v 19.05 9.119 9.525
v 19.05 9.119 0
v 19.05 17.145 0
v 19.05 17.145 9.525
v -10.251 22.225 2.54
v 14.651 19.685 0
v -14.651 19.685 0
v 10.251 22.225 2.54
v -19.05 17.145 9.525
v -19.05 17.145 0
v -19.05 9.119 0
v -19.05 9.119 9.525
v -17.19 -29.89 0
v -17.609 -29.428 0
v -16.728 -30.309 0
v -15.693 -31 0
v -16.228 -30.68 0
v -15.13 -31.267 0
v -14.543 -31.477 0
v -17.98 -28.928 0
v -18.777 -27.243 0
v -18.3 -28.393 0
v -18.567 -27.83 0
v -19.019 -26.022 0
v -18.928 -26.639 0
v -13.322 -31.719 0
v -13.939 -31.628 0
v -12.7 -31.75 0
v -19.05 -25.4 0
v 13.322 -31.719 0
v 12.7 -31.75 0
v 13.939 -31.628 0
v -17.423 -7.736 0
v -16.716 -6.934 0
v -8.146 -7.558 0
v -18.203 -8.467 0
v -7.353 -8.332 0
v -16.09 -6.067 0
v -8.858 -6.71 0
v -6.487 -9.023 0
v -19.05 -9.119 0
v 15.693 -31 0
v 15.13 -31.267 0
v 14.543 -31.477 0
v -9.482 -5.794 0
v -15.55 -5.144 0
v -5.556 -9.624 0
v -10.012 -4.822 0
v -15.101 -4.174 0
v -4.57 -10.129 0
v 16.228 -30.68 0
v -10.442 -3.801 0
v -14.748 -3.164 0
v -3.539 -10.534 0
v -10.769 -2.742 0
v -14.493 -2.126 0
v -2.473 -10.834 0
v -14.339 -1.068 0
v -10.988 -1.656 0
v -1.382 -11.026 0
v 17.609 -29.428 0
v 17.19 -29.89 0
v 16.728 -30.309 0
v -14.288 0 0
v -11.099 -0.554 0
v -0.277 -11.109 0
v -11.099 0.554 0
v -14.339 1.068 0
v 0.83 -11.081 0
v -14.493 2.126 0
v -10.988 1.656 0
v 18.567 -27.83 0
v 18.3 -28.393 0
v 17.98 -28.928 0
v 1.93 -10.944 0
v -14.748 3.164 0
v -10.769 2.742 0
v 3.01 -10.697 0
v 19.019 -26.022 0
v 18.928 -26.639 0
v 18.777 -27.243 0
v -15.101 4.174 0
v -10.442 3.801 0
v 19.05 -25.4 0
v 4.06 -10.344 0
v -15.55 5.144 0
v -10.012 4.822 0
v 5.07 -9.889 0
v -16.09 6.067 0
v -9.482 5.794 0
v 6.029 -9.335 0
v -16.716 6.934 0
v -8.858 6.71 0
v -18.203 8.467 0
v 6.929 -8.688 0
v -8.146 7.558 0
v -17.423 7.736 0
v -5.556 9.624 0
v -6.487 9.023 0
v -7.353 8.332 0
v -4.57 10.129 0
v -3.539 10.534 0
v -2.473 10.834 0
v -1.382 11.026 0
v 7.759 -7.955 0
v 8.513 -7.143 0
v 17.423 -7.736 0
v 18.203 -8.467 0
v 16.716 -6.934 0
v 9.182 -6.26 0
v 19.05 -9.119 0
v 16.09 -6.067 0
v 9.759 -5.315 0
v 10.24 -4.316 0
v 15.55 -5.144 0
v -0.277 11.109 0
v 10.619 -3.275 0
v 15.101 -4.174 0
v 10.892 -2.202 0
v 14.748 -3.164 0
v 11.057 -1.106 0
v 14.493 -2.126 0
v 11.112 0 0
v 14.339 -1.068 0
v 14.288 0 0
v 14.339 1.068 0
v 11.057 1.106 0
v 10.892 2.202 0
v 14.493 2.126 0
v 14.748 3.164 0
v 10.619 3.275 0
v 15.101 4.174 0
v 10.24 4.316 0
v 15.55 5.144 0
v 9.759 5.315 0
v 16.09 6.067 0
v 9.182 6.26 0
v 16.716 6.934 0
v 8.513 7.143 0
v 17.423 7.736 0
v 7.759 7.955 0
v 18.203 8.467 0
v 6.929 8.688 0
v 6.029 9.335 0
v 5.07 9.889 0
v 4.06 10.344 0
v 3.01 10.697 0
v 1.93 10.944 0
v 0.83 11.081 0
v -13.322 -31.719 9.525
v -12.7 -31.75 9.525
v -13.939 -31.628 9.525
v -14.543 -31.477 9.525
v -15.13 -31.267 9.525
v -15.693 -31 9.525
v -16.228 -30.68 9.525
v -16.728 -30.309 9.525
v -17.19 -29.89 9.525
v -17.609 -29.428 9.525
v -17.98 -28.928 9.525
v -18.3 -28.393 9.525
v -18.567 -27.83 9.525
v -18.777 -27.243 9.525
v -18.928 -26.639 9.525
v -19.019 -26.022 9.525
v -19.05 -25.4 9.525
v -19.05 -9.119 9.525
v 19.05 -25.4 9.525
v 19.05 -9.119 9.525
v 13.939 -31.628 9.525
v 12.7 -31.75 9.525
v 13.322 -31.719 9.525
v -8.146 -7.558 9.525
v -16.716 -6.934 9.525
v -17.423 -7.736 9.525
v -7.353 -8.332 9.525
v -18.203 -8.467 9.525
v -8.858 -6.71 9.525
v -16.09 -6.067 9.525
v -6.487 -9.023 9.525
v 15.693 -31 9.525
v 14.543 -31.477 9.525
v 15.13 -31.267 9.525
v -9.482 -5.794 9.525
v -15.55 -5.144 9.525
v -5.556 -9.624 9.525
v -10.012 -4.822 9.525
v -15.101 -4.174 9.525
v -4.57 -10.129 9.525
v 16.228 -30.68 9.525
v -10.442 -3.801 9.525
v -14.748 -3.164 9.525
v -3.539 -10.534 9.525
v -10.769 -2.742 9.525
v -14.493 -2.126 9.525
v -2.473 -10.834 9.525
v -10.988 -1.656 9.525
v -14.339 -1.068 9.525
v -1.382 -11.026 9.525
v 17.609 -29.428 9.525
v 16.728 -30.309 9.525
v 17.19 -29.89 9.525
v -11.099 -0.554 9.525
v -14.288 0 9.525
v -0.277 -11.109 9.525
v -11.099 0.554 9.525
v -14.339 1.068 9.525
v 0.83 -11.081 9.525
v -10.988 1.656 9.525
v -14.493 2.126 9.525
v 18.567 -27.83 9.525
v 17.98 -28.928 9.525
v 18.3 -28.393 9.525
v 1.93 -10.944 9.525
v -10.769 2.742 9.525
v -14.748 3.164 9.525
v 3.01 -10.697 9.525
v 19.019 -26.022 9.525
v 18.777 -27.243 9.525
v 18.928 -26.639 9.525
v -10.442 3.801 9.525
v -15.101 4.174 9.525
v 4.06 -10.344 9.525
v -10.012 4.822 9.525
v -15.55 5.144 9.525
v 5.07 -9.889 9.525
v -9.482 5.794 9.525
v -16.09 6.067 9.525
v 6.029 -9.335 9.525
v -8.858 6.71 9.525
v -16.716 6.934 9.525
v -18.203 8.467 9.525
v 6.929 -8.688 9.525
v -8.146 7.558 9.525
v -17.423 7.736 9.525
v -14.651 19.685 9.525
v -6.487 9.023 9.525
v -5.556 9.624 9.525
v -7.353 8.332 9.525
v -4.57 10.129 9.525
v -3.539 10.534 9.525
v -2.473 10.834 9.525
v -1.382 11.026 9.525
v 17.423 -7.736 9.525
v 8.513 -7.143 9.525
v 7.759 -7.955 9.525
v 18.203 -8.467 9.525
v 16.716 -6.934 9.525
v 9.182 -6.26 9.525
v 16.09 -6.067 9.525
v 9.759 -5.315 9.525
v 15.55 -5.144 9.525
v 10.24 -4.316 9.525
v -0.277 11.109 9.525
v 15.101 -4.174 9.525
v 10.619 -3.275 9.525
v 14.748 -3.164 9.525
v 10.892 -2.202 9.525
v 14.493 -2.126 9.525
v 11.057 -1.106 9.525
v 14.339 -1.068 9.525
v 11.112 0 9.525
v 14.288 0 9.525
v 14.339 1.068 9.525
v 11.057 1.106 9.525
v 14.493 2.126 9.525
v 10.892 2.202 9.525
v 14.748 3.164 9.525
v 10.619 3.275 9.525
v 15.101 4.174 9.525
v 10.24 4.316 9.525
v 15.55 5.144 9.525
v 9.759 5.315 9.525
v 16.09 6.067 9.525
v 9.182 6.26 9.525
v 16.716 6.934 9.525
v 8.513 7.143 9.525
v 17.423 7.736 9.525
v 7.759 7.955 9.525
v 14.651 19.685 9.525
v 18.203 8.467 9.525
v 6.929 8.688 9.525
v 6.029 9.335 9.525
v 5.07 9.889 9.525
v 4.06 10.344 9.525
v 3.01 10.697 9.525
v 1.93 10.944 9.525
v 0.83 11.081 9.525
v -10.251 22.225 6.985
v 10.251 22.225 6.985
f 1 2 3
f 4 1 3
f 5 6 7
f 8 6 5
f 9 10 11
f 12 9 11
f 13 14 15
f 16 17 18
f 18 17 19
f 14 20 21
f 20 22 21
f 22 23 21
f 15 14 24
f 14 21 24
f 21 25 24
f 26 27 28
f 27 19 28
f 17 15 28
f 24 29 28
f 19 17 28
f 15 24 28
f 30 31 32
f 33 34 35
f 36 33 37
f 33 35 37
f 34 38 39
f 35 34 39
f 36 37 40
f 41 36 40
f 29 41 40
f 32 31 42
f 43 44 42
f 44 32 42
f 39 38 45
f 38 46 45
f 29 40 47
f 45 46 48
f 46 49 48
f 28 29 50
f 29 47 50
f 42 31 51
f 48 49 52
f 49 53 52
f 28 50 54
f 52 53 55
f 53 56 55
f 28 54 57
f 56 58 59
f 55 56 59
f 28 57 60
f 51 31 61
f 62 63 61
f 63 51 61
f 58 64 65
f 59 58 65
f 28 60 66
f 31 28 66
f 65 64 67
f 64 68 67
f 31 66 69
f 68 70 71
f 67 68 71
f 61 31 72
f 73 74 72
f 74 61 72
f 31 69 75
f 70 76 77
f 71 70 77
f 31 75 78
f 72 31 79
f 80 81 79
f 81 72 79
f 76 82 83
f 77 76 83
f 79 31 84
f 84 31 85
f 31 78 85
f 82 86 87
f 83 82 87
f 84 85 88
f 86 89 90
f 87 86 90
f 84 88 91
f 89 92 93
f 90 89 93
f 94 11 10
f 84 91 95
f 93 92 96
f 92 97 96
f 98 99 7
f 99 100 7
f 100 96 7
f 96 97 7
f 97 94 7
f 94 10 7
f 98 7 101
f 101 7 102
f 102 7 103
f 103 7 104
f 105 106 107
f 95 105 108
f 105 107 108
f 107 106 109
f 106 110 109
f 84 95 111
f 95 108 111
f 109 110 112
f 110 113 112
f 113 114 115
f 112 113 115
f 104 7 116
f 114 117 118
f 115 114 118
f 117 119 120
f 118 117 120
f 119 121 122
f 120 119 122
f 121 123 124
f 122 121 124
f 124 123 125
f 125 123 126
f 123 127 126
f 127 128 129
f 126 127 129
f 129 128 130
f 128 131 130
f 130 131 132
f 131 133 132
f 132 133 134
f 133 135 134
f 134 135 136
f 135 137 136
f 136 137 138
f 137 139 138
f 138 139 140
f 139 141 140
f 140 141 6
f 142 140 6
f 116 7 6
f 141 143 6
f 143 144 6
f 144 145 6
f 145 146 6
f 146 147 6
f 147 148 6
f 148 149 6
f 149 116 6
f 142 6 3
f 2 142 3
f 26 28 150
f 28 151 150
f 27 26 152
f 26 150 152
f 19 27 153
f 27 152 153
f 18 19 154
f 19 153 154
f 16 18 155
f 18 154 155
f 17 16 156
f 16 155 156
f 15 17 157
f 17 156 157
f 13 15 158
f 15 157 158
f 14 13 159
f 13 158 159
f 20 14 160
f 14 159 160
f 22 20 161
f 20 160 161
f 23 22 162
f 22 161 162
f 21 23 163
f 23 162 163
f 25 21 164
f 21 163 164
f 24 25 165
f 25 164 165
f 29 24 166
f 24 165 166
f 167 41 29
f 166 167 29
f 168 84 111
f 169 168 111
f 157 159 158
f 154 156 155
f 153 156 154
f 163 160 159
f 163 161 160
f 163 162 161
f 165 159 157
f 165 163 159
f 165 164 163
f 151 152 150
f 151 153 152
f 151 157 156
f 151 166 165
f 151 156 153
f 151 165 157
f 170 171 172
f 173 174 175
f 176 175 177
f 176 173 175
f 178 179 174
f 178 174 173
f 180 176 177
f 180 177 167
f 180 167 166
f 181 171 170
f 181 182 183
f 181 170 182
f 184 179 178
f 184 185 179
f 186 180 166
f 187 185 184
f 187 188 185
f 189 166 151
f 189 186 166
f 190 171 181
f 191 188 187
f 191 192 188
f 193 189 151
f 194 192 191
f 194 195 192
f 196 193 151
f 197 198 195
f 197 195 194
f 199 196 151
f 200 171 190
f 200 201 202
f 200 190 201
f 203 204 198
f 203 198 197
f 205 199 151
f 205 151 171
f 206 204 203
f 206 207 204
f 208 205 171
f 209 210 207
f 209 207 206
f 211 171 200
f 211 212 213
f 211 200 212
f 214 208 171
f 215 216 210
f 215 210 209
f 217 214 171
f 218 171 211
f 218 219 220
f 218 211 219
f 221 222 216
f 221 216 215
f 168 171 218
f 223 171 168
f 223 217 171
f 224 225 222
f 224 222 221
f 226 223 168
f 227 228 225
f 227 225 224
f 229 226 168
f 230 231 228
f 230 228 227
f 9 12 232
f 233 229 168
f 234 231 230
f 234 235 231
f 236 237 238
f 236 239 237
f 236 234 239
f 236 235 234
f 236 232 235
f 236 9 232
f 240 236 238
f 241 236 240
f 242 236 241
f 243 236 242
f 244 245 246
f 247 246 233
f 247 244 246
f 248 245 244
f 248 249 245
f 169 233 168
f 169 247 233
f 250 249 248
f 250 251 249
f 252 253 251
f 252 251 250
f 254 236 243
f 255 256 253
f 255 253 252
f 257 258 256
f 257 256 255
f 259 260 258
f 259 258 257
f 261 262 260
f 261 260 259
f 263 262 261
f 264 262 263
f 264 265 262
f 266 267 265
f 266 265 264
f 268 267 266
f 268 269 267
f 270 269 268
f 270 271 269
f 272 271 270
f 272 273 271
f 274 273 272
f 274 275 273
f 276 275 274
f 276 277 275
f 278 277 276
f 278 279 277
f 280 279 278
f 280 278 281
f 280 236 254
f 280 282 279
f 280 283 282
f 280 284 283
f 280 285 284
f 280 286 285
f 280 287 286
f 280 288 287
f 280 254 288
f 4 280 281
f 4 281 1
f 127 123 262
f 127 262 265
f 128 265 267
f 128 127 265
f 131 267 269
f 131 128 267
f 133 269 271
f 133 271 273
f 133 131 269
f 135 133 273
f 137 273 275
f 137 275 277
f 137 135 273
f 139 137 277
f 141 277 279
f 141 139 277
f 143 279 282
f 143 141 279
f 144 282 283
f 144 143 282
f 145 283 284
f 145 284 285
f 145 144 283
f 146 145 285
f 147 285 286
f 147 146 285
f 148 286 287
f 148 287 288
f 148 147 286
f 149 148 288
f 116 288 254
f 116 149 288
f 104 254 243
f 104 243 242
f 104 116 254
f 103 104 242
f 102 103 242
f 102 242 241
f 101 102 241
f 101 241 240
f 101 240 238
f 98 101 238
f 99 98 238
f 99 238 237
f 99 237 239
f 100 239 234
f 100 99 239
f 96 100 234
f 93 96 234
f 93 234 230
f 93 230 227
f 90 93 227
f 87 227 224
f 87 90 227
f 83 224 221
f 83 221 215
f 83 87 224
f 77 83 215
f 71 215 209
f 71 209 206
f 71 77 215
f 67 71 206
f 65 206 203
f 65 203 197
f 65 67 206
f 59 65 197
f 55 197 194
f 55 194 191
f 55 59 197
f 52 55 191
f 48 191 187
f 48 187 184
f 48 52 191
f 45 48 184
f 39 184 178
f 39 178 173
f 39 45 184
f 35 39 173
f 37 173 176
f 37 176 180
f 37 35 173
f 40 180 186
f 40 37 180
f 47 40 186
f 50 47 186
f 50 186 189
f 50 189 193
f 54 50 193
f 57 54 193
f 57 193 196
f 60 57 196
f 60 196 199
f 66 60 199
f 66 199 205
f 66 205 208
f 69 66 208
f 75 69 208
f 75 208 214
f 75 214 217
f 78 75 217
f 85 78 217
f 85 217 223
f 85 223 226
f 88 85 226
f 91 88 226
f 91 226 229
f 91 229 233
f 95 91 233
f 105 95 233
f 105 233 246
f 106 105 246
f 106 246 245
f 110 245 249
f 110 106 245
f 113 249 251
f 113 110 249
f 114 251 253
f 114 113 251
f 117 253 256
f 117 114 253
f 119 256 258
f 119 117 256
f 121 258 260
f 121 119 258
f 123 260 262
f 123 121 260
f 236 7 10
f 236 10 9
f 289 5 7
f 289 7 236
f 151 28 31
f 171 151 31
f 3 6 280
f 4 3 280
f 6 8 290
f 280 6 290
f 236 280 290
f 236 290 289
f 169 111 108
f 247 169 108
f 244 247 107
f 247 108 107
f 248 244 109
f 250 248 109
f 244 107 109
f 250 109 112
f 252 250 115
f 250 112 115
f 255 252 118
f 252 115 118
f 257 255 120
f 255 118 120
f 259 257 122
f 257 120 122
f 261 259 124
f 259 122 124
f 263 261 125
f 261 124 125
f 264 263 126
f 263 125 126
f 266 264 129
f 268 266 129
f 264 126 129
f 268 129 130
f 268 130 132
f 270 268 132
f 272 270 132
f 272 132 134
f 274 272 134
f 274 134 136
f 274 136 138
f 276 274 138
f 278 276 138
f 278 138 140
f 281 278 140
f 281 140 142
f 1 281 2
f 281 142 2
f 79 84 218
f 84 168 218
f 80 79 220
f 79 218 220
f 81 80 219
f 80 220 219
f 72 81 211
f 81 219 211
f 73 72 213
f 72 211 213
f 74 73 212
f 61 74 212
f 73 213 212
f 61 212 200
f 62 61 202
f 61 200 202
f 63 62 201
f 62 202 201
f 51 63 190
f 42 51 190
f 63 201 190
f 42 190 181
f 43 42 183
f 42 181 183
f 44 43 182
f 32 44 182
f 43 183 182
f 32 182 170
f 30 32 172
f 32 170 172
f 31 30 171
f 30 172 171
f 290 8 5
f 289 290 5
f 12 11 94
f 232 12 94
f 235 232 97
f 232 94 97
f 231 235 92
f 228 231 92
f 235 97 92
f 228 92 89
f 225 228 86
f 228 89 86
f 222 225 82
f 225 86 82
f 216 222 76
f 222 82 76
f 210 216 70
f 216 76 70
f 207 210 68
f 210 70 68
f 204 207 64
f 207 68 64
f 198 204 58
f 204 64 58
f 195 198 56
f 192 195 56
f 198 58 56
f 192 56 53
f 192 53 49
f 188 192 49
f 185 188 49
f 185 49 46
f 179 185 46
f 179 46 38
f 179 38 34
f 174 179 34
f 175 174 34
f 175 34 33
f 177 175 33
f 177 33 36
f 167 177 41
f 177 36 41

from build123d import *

# Parameters (mm, degrees)
F0_R       = 11.1125
F1_DEPTH   = 9.525
F2_SIZE2   = 8.7988181024
F2_SIZE    = 5.08
F2_2_SIZE2 = 8.7988181024
F2_2_SIZE  = 5.08
F3_SIZE2   = 2.54
F3_SIZE    = 2.54
F4_R       = 6.35


with BuildPart() as f1:
    # F0 (on Top) → F1 (new body)
    with BuildSketch(Plane.XY):
        with BuildLine():
            Line((19.05, 22.225), (-19.05, 22.225))
            Line((-19.05, 22.225), (-19.05, 9.1194932014))
            ThreePointArc((-19.05, 9.1194932014), (-14.2875, 0), (-19.05, -9.1194932014))
            Line((-19.05, -9.1194932014), (-19.05, -31.75))
            Line((-19.05, -31.75), (19.05, -31.75))
            Line((19.05, -31.75), (19.05, -9.1194932014))
            ThreePointArc((19.05, -9.1194932014), (14.2875, 0), (19.05, 9.1194932014))
            Line((19.05, 9.1194932014), (19.05, 22.225))
        make_face()
        Circle(F0_R, mode=Mode.SUBTRACT)
    extrude(amount=F1_DEPTH)

    # F2
    f2_edges = [f1.edges().sort_by_distance(p)[0] for p in [
        (-19.05, 22.225, 4.7625),
    ]]
    f2_side = f1.faces().sort_by_distance((-19.05, 15.672247, 4.7625))[0]
    chamfer(f2_edges, length=F2_SIZE, length2=F2_SIZE2, reference=f2_side)

    # F2#2
    f2_2_edges = [f1.edges().sort_by_distance(p)[0] for p in [
        (19.05, 22.225, 4.7625),
    ]]
    f2_2_side = f1.faces().sort_by_distance((19.05, 15.672247, 4.7625))[0]
    chamfer(f2_2_edges, length=F2_2_SIZE, length2=F2_2_SIZE2, reference=f2_2_side)

    # F3
    f3_edges = [f1.edges().sort_by_distance(p)[0] for p in [
        (0, 22.225, 9.525),
        (0, 22.225, 0),
    ]]
    chamfer(f3_edges, length=F3_SIZE, length2=F3_SIZE2)

    # F4
    f4_edges = [f1.edges().sort_by_distance(p)[0] for p in [
        (19.05, -31.75, 4.7625),
        (-19.05, -31.75, 4.7625),
    ]]
    fillet(f4_edges, radius=F4_R)


solid = f1.part
